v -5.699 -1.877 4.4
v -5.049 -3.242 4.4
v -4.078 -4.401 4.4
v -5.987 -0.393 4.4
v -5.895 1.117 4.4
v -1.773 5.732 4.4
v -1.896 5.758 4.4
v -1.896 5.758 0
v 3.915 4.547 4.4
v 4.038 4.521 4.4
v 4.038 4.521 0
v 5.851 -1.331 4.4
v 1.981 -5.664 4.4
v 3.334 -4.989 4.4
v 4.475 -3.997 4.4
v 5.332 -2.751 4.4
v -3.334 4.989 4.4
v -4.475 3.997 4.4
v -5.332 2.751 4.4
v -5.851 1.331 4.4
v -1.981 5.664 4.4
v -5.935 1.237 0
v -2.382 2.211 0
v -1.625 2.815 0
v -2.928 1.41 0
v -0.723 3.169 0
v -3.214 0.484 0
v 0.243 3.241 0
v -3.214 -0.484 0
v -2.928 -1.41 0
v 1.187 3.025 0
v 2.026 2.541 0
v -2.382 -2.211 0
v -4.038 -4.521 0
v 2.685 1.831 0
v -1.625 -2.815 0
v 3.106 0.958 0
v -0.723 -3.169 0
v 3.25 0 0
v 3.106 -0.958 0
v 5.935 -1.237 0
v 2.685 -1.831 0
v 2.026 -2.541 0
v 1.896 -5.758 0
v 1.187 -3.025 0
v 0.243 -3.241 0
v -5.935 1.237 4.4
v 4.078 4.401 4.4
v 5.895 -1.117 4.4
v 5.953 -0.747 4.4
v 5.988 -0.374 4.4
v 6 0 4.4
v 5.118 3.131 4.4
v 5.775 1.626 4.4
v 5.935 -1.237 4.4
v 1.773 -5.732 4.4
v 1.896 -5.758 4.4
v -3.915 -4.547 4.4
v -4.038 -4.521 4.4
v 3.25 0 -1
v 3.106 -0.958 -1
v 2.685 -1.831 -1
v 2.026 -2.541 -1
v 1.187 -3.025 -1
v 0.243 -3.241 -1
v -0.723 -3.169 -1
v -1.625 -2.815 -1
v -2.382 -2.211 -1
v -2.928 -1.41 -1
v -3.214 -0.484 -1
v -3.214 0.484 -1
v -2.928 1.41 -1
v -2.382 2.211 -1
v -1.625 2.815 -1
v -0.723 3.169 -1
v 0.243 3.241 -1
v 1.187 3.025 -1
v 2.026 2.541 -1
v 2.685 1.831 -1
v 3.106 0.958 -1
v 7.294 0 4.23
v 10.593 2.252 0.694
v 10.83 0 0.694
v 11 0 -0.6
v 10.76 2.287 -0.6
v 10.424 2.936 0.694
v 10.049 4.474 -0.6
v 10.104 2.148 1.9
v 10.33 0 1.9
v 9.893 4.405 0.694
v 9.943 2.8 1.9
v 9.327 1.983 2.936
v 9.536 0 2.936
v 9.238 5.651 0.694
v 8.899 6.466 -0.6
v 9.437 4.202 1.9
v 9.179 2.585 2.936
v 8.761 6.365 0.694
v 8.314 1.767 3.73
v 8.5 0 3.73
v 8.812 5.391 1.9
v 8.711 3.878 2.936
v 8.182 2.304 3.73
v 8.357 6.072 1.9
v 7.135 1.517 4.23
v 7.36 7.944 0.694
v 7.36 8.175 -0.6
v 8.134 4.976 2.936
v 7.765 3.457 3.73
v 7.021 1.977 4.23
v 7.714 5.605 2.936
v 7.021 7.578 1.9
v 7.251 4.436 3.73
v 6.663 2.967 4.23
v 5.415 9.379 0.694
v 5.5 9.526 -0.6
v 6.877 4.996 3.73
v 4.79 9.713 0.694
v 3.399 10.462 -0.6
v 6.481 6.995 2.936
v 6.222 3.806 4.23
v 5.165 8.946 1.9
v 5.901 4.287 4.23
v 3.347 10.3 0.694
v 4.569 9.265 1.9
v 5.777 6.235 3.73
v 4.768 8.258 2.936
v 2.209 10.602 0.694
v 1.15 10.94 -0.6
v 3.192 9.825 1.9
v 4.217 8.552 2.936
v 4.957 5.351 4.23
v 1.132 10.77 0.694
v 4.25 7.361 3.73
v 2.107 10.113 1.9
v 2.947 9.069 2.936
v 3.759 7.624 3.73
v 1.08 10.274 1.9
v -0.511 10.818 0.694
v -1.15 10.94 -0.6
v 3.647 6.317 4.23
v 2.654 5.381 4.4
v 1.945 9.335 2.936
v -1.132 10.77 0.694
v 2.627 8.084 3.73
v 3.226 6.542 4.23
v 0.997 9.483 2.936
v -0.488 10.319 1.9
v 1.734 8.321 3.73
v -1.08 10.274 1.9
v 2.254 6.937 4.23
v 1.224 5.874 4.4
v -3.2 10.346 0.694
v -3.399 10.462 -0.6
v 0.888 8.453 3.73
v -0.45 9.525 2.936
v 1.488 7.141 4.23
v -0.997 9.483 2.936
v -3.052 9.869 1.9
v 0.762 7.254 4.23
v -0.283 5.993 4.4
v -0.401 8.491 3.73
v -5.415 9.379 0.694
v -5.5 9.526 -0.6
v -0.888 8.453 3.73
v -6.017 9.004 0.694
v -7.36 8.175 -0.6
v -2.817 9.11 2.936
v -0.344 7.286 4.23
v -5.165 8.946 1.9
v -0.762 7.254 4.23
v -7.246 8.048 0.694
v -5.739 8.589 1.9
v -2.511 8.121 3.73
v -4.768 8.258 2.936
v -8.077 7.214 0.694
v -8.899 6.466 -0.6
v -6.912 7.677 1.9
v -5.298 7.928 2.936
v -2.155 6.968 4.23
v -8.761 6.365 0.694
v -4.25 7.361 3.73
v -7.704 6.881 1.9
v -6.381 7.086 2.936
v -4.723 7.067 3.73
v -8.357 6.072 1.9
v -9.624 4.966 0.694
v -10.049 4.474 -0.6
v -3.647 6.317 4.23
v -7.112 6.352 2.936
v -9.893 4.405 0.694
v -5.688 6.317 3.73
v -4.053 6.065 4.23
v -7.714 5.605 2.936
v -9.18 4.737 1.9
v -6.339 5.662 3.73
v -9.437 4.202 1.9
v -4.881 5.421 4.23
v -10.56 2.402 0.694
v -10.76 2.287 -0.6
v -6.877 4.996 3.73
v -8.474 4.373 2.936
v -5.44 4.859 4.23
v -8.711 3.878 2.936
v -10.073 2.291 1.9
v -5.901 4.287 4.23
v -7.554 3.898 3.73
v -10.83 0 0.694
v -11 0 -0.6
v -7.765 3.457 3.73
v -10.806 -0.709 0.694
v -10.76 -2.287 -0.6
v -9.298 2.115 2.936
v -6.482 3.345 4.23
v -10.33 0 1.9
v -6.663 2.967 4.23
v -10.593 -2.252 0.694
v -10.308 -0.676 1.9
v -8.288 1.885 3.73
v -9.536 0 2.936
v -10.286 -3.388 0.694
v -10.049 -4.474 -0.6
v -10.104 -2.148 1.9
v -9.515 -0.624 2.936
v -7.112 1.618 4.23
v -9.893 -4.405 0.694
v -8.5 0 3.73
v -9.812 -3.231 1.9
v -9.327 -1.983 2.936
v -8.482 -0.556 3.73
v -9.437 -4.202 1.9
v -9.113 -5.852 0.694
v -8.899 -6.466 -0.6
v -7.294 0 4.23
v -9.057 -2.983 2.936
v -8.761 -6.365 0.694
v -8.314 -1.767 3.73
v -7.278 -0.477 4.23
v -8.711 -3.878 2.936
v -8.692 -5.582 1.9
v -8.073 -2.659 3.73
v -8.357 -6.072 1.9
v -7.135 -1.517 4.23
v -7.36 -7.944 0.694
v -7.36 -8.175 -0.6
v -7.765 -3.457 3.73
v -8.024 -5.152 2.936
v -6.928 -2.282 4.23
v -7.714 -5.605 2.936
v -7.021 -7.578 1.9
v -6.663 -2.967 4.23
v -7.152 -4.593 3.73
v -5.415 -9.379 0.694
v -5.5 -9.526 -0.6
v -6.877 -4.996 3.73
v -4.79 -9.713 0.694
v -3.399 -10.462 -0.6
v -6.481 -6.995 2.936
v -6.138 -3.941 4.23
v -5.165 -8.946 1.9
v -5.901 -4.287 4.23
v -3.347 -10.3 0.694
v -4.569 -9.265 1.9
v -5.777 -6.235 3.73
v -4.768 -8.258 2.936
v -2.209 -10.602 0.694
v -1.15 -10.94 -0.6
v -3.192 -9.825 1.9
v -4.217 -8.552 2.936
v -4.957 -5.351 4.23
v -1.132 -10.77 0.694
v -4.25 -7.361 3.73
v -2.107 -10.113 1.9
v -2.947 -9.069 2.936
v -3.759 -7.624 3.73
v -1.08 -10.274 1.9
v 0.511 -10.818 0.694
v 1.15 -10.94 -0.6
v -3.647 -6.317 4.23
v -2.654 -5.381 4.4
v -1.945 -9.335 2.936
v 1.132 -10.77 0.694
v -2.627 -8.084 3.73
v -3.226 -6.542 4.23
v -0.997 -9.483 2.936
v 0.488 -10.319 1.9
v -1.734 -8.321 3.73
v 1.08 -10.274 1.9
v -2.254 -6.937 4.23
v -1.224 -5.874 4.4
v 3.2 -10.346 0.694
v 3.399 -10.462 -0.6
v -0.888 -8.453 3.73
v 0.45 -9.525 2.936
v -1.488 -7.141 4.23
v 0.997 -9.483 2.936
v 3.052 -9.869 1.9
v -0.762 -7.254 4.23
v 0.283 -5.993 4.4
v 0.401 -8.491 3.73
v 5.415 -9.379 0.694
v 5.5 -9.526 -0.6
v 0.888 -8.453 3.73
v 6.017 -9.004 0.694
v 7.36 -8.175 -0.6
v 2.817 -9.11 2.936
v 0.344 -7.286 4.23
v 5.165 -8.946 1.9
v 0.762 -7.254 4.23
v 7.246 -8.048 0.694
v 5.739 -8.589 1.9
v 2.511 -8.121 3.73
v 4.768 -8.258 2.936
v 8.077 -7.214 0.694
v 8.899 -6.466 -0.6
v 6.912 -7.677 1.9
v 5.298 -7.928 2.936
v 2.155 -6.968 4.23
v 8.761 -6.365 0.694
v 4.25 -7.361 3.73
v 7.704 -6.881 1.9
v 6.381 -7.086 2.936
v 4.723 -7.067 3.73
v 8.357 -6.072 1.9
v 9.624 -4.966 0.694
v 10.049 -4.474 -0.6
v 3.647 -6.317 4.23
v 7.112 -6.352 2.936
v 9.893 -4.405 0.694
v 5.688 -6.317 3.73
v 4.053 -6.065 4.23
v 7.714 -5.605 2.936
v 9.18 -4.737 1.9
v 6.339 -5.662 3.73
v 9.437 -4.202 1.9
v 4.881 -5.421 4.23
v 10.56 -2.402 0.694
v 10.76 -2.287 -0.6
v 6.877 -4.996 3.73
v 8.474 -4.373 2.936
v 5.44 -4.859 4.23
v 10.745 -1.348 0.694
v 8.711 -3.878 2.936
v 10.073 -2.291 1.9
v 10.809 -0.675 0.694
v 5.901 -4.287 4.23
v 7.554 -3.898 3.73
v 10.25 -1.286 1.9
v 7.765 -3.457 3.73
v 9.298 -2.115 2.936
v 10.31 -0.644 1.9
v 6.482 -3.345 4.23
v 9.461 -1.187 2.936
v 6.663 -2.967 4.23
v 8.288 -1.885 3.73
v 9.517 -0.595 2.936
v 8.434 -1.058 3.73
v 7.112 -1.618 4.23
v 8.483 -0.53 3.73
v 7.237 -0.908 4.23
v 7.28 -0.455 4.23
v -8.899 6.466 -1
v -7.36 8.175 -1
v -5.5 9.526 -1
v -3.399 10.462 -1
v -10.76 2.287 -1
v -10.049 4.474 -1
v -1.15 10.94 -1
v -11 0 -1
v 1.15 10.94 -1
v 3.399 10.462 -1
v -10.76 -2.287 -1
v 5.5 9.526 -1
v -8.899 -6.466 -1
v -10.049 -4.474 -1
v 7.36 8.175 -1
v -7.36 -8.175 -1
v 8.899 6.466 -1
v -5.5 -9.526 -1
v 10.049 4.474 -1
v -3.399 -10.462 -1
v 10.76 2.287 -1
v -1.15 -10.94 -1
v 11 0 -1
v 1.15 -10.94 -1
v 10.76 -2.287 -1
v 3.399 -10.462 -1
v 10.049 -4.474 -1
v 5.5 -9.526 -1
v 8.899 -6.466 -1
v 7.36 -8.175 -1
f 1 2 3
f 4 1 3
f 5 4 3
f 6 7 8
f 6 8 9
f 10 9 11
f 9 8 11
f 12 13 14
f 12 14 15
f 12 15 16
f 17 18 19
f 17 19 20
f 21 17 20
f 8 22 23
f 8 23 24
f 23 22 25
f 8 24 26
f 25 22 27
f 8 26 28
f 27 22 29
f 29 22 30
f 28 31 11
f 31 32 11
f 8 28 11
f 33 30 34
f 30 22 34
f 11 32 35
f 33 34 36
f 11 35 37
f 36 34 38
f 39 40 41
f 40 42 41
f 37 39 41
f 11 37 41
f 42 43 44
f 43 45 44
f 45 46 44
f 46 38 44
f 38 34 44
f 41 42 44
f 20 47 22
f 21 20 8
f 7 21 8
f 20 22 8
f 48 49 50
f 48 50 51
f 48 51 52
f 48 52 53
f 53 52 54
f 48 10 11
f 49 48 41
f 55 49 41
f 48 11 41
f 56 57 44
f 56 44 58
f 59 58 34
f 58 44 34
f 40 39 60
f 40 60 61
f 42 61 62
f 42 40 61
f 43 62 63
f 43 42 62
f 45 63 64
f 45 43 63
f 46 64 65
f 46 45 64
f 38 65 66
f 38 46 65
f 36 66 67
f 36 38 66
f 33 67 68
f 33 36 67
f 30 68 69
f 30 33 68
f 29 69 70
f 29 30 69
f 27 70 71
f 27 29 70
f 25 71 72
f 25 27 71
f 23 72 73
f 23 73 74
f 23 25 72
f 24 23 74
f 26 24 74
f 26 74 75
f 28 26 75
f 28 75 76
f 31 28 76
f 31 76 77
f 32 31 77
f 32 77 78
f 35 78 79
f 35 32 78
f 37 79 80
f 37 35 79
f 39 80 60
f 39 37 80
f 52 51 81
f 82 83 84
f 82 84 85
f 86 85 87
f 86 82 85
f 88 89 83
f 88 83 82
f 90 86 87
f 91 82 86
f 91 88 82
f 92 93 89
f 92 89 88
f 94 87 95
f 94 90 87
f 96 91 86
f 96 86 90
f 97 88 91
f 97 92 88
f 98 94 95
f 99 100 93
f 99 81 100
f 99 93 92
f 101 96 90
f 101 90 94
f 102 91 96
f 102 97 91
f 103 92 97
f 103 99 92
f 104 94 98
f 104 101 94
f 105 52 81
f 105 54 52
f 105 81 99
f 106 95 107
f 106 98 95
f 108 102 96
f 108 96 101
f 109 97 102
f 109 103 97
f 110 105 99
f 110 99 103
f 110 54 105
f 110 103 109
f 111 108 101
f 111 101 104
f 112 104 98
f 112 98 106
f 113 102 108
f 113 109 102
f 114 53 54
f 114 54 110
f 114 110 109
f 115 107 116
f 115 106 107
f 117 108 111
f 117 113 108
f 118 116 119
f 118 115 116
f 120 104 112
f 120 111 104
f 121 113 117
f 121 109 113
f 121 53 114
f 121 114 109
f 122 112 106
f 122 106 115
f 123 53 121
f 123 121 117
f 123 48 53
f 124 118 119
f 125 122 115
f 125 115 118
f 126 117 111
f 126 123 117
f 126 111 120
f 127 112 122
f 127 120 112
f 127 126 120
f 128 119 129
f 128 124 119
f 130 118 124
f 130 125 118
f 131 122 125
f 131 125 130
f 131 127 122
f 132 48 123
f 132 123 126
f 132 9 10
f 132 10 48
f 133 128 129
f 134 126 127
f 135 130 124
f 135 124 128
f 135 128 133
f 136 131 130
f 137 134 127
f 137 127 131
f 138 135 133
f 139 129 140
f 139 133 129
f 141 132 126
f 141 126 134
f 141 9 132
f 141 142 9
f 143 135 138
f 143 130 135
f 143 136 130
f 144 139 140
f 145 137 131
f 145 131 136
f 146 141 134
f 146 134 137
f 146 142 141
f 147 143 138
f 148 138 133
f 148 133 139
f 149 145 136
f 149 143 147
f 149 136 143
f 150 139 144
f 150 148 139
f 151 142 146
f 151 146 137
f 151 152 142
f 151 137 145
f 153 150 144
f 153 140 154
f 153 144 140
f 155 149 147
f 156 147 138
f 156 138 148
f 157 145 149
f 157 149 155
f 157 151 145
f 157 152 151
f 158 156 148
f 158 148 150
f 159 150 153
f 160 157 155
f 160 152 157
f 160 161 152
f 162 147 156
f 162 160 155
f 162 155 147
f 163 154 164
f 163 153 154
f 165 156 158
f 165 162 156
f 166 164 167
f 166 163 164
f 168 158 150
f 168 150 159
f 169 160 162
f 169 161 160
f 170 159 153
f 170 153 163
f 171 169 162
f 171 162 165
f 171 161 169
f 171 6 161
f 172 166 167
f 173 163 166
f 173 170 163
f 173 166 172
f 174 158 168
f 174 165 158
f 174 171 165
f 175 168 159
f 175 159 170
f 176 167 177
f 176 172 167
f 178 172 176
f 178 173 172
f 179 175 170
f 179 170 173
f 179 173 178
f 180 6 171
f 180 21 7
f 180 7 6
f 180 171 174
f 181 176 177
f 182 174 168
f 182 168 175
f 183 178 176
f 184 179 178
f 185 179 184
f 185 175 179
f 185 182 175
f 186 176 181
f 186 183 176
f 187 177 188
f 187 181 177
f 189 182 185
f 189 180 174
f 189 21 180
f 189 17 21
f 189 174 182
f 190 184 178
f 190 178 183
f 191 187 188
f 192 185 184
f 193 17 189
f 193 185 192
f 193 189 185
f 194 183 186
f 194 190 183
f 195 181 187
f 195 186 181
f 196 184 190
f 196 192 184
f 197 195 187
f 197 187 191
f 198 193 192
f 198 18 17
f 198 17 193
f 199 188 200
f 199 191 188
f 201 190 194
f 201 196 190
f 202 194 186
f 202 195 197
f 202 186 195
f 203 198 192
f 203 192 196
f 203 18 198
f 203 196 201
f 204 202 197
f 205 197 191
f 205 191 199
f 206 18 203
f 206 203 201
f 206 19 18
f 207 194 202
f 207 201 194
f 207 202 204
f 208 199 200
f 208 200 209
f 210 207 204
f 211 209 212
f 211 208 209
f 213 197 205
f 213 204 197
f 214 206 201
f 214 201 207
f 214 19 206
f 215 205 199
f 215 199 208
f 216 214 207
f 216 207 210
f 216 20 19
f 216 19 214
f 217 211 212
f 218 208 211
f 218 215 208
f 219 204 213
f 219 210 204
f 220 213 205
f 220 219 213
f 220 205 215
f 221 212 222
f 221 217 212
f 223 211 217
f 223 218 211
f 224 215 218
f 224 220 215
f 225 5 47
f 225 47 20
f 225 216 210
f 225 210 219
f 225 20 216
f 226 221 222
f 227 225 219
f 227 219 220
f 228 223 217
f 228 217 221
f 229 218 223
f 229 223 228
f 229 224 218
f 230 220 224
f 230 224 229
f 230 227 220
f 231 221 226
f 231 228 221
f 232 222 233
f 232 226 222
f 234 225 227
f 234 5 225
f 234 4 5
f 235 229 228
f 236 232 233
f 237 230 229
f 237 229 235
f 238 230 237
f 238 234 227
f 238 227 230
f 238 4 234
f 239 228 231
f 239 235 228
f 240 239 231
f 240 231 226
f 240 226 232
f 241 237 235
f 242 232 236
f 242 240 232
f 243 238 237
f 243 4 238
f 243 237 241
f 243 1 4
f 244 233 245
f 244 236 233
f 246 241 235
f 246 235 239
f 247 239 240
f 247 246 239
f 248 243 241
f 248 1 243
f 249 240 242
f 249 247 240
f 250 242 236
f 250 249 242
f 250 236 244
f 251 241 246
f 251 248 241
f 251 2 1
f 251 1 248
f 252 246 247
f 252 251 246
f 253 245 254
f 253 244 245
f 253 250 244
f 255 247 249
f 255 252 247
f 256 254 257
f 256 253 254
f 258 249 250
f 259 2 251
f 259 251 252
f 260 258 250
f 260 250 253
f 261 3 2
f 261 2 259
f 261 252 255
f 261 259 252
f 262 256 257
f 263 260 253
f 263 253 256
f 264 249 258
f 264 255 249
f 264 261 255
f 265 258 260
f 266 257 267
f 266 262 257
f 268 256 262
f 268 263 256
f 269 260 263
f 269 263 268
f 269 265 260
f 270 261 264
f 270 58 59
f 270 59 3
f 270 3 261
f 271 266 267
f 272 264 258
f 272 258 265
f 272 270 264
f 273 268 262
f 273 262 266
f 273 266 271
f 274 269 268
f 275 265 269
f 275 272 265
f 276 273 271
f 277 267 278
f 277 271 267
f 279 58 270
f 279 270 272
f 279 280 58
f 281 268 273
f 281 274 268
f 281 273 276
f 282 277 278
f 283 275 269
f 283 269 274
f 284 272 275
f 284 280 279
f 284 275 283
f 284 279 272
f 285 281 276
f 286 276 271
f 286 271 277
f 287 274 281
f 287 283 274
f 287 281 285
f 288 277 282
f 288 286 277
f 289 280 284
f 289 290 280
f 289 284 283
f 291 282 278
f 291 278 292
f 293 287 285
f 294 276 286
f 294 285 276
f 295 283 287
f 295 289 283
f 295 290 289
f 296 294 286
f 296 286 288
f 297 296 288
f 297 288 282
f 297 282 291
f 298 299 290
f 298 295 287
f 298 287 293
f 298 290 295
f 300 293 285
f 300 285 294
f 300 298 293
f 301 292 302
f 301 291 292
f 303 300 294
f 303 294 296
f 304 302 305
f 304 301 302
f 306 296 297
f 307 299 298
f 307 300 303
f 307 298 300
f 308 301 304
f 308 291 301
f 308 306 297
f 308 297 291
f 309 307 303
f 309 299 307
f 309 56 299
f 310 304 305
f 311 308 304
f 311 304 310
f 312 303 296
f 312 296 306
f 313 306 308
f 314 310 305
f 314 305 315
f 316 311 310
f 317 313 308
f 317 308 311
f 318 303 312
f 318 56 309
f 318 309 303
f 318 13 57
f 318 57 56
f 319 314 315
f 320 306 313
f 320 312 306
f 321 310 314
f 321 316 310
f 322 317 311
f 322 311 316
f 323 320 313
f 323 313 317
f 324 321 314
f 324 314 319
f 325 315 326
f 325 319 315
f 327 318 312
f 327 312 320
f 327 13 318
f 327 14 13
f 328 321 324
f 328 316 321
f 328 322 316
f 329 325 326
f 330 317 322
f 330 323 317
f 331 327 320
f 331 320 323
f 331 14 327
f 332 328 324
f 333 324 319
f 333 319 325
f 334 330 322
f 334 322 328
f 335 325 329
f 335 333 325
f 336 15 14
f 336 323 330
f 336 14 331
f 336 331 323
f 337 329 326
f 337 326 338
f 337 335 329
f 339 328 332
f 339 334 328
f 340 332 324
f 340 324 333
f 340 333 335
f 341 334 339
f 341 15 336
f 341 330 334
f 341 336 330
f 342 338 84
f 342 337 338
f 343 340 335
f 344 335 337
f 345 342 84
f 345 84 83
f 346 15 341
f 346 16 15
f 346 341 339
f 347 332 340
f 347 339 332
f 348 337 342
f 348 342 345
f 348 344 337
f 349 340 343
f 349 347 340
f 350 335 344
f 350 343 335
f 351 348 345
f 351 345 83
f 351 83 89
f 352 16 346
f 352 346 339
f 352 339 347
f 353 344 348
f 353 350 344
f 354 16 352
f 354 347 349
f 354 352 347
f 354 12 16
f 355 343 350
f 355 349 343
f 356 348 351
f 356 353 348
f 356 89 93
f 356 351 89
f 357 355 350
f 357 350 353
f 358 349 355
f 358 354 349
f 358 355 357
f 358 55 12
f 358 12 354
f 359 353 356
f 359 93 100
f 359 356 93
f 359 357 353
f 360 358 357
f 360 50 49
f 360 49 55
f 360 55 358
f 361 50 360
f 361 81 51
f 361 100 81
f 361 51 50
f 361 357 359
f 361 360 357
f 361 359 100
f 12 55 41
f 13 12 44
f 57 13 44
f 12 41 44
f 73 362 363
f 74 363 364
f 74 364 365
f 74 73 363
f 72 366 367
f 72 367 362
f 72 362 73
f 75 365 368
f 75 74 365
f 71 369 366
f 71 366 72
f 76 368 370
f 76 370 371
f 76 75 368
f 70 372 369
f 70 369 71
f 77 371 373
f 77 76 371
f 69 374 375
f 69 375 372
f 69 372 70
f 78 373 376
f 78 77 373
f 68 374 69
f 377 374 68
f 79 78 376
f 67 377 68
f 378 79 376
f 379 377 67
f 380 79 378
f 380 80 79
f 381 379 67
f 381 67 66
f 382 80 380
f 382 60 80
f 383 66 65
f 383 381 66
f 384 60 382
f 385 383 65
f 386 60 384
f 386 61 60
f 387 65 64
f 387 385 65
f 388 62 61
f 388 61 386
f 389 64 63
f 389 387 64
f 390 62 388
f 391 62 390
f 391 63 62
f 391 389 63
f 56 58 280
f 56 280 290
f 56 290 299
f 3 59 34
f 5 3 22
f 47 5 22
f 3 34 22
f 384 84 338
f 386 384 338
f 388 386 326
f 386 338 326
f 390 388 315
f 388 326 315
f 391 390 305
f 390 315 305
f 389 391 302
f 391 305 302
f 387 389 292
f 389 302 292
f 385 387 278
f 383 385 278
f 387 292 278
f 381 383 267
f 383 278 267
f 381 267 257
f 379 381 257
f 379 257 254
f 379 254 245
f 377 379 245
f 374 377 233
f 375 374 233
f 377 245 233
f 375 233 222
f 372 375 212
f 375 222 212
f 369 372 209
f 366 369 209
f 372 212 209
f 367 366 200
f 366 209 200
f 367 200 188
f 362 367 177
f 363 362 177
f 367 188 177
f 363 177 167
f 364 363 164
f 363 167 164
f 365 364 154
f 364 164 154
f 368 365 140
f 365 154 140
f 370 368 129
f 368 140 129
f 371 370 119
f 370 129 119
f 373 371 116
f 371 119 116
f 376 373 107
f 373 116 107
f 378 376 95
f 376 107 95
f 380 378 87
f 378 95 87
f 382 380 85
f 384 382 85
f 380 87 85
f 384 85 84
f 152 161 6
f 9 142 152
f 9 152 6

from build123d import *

# Parameters (mm, degrees)
F0_R     = 11
F1_DEPTH = 4.4
F2_R     = 11
F2_R_2   = 3.25
F3_DEPTH = 1


# Not quite as in the source:
# - a fillet or chamfer that OpenCascade refuses, or shapes differently, is made with other operations: its cross-section is extruded or revolved along the edge and cut away or added


with BuildPart() as f1:
    # F0 (on Top) → F1 (new body)
    with BuildSketch(Plane.XY):
        Circle(F0_R)
        Polygon((4.0383603583, 4.521243813), (5.9346921779, -1.2367007534), (1.8963318196, -5.7579445664), (-4.0383603583, -4.521243813), (-5.9346921779, 1.2367007534), (-1.8963318196, 5.7579445664), align=None, mode=Mode.SUBTRACT)
    extrude(amount=F1_DEPTH)

    # F2 (on face) → F3 (join)
    with BuildSketch(Plane(origin=(0, 0, 0), x_dir=(1, 0, 0), z_dir=(0, 0, -1))):
        Circle(F2_R)
        Circle(F2_R_2, mode=Mode.SUBTRACT)
    extrude(amount=F3_DEPTH)

    # F4: fillet of radius 5 on 1 edges, made by hand

    # F4_s1 → F4_t2 (revolve, cut)
    with BuildSketch(Plane.XZ):
        with BuildLine():
            ThreePointArc((11, -0.6), (9.5355339059, 2.9355339059), (6, 4.4))
            Line((6, 4.4), (11, 4.4))
            Line((11, 4.4), (11, -0.6))
        make_face()
    revolve(axis=Axis((0, 0, 4.4), (0, 0, 1)), mode=Mode.SUBTRACT)


solid = f1.part
